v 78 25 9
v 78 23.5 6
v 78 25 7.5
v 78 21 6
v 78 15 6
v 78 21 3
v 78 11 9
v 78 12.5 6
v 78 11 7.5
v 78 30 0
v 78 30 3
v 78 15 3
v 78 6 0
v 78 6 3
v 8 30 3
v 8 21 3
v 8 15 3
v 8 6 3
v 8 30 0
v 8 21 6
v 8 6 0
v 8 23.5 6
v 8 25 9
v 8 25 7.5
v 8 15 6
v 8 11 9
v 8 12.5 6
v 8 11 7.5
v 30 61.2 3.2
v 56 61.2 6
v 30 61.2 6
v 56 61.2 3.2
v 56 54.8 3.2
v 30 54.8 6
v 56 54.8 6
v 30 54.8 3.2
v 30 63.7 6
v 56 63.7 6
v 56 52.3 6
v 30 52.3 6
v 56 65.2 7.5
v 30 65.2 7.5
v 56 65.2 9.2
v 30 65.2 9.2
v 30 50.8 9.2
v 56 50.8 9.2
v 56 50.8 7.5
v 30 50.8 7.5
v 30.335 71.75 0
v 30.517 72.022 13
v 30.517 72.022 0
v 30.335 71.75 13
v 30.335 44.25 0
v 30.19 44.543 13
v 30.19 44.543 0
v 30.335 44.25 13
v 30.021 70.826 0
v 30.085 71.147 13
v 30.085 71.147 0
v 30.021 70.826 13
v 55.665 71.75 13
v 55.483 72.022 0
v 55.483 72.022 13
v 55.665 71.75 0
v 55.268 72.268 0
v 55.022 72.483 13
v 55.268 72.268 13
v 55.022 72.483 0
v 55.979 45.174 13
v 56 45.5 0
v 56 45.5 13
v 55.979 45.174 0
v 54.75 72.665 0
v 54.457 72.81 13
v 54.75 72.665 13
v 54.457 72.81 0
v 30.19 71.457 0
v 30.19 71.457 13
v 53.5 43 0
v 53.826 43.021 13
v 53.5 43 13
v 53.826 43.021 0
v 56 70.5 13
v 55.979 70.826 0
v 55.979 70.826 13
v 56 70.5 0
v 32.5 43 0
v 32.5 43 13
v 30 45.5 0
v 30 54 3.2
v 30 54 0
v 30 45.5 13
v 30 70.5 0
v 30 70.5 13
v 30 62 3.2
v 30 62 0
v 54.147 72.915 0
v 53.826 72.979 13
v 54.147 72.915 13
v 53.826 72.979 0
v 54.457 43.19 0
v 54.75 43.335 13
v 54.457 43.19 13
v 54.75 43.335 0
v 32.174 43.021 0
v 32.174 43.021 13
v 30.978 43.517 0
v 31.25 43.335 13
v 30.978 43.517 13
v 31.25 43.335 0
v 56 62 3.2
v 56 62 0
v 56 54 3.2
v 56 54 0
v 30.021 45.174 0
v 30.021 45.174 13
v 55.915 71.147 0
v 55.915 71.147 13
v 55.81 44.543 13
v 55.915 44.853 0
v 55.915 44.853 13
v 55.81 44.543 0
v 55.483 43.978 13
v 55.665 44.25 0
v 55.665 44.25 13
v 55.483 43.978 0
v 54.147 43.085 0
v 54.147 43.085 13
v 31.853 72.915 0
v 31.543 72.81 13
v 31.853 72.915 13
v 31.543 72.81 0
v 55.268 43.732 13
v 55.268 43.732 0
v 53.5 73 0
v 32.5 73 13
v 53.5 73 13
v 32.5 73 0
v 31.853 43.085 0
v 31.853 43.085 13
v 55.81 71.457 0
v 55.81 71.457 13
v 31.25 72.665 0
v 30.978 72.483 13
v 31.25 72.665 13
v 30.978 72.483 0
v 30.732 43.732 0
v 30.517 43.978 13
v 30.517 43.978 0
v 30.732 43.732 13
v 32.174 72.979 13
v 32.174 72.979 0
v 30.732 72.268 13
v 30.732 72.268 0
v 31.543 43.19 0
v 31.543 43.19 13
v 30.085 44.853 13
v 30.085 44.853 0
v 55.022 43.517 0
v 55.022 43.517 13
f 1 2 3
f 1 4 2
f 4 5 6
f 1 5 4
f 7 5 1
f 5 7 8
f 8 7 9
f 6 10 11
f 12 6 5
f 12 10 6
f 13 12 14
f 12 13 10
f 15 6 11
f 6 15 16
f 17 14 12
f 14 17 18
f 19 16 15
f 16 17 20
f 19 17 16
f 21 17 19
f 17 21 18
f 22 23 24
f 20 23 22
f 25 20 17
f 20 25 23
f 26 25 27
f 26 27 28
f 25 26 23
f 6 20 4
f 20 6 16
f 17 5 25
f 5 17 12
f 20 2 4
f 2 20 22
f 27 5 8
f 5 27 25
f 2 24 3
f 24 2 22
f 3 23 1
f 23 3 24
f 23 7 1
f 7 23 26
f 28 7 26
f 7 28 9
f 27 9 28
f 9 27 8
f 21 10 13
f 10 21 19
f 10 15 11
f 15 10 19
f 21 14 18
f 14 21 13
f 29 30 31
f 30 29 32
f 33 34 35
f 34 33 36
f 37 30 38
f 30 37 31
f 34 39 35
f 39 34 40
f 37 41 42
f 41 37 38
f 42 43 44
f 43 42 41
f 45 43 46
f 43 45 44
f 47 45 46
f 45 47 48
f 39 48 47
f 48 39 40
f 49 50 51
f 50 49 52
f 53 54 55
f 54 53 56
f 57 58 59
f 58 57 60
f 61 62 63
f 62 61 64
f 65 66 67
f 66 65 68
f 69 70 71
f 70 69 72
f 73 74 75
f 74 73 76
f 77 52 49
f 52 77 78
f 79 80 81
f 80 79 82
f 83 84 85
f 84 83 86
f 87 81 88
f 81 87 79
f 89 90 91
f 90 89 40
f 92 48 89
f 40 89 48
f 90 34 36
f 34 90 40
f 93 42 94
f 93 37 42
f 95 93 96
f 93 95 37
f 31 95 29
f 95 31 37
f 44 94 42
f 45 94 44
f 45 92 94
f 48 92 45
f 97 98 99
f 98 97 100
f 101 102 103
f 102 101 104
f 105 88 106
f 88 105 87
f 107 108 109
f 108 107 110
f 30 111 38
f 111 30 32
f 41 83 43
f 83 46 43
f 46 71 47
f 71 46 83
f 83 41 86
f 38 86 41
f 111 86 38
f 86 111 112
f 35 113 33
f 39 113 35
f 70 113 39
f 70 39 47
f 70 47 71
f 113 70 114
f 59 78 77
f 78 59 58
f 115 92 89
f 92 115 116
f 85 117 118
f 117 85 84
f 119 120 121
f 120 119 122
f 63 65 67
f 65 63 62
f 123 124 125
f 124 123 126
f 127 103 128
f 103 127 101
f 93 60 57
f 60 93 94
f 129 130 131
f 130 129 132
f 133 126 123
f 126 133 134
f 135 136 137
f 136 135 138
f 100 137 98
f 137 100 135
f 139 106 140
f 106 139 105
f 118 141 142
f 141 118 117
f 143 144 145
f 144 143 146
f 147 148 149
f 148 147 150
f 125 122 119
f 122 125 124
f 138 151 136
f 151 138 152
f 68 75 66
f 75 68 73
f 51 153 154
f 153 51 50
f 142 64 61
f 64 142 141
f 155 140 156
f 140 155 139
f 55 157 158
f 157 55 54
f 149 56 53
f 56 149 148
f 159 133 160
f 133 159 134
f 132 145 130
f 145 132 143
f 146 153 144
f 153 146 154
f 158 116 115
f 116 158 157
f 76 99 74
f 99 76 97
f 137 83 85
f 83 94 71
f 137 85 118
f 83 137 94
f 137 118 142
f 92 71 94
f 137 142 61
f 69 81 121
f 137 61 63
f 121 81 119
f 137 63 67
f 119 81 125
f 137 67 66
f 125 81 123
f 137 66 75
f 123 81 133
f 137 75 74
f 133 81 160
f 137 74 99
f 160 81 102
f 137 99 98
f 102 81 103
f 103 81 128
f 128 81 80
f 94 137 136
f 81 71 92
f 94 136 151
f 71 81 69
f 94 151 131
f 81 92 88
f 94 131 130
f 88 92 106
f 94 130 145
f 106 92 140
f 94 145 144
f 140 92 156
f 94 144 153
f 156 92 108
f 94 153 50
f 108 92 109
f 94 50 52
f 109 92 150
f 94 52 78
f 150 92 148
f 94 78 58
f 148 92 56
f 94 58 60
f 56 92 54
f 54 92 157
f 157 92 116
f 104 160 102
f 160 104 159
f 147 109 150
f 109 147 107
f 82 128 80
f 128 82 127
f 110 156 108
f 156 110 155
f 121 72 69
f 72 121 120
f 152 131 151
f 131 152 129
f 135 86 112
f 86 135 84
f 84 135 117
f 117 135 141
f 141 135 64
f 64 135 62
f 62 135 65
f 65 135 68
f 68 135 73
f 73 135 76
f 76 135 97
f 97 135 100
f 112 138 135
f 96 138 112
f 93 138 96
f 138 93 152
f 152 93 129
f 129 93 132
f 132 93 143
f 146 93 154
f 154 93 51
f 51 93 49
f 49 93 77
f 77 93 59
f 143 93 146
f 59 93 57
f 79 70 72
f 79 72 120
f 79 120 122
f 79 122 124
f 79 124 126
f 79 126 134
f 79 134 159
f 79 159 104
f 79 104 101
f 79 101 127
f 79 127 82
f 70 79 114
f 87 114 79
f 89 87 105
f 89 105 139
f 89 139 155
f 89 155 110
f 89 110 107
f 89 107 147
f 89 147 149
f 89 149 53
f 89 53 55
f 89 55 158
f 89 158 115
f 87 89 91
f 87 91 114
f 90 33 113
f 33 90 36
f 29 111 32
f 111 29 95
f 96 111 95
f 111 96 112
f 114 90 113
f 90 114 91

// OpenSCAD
/*
Sample 089: Pilzkopf-/T-Linearführung — 0,20 mm
Generated from the FDM Mechanical Sample Library.
Units: millimetres.

Override examples:
  openscad -o custom.stl -D 'view="plate"' -D 'render_fn=64' model.scad
  openscad -o preview.png -D 'view="assembly"' model.scad
*/
use <../../../library/fdm_mechanisms.scad>

render_fn = is_undef(render_fn) ? 48 : render_fn;
view = is_undef(view) ? "plate" : view;
$fn = render_fn;

sample_t_rail(
    view=view,
    clearance=0.2,
    length=70,
    carriage_l=26
);
